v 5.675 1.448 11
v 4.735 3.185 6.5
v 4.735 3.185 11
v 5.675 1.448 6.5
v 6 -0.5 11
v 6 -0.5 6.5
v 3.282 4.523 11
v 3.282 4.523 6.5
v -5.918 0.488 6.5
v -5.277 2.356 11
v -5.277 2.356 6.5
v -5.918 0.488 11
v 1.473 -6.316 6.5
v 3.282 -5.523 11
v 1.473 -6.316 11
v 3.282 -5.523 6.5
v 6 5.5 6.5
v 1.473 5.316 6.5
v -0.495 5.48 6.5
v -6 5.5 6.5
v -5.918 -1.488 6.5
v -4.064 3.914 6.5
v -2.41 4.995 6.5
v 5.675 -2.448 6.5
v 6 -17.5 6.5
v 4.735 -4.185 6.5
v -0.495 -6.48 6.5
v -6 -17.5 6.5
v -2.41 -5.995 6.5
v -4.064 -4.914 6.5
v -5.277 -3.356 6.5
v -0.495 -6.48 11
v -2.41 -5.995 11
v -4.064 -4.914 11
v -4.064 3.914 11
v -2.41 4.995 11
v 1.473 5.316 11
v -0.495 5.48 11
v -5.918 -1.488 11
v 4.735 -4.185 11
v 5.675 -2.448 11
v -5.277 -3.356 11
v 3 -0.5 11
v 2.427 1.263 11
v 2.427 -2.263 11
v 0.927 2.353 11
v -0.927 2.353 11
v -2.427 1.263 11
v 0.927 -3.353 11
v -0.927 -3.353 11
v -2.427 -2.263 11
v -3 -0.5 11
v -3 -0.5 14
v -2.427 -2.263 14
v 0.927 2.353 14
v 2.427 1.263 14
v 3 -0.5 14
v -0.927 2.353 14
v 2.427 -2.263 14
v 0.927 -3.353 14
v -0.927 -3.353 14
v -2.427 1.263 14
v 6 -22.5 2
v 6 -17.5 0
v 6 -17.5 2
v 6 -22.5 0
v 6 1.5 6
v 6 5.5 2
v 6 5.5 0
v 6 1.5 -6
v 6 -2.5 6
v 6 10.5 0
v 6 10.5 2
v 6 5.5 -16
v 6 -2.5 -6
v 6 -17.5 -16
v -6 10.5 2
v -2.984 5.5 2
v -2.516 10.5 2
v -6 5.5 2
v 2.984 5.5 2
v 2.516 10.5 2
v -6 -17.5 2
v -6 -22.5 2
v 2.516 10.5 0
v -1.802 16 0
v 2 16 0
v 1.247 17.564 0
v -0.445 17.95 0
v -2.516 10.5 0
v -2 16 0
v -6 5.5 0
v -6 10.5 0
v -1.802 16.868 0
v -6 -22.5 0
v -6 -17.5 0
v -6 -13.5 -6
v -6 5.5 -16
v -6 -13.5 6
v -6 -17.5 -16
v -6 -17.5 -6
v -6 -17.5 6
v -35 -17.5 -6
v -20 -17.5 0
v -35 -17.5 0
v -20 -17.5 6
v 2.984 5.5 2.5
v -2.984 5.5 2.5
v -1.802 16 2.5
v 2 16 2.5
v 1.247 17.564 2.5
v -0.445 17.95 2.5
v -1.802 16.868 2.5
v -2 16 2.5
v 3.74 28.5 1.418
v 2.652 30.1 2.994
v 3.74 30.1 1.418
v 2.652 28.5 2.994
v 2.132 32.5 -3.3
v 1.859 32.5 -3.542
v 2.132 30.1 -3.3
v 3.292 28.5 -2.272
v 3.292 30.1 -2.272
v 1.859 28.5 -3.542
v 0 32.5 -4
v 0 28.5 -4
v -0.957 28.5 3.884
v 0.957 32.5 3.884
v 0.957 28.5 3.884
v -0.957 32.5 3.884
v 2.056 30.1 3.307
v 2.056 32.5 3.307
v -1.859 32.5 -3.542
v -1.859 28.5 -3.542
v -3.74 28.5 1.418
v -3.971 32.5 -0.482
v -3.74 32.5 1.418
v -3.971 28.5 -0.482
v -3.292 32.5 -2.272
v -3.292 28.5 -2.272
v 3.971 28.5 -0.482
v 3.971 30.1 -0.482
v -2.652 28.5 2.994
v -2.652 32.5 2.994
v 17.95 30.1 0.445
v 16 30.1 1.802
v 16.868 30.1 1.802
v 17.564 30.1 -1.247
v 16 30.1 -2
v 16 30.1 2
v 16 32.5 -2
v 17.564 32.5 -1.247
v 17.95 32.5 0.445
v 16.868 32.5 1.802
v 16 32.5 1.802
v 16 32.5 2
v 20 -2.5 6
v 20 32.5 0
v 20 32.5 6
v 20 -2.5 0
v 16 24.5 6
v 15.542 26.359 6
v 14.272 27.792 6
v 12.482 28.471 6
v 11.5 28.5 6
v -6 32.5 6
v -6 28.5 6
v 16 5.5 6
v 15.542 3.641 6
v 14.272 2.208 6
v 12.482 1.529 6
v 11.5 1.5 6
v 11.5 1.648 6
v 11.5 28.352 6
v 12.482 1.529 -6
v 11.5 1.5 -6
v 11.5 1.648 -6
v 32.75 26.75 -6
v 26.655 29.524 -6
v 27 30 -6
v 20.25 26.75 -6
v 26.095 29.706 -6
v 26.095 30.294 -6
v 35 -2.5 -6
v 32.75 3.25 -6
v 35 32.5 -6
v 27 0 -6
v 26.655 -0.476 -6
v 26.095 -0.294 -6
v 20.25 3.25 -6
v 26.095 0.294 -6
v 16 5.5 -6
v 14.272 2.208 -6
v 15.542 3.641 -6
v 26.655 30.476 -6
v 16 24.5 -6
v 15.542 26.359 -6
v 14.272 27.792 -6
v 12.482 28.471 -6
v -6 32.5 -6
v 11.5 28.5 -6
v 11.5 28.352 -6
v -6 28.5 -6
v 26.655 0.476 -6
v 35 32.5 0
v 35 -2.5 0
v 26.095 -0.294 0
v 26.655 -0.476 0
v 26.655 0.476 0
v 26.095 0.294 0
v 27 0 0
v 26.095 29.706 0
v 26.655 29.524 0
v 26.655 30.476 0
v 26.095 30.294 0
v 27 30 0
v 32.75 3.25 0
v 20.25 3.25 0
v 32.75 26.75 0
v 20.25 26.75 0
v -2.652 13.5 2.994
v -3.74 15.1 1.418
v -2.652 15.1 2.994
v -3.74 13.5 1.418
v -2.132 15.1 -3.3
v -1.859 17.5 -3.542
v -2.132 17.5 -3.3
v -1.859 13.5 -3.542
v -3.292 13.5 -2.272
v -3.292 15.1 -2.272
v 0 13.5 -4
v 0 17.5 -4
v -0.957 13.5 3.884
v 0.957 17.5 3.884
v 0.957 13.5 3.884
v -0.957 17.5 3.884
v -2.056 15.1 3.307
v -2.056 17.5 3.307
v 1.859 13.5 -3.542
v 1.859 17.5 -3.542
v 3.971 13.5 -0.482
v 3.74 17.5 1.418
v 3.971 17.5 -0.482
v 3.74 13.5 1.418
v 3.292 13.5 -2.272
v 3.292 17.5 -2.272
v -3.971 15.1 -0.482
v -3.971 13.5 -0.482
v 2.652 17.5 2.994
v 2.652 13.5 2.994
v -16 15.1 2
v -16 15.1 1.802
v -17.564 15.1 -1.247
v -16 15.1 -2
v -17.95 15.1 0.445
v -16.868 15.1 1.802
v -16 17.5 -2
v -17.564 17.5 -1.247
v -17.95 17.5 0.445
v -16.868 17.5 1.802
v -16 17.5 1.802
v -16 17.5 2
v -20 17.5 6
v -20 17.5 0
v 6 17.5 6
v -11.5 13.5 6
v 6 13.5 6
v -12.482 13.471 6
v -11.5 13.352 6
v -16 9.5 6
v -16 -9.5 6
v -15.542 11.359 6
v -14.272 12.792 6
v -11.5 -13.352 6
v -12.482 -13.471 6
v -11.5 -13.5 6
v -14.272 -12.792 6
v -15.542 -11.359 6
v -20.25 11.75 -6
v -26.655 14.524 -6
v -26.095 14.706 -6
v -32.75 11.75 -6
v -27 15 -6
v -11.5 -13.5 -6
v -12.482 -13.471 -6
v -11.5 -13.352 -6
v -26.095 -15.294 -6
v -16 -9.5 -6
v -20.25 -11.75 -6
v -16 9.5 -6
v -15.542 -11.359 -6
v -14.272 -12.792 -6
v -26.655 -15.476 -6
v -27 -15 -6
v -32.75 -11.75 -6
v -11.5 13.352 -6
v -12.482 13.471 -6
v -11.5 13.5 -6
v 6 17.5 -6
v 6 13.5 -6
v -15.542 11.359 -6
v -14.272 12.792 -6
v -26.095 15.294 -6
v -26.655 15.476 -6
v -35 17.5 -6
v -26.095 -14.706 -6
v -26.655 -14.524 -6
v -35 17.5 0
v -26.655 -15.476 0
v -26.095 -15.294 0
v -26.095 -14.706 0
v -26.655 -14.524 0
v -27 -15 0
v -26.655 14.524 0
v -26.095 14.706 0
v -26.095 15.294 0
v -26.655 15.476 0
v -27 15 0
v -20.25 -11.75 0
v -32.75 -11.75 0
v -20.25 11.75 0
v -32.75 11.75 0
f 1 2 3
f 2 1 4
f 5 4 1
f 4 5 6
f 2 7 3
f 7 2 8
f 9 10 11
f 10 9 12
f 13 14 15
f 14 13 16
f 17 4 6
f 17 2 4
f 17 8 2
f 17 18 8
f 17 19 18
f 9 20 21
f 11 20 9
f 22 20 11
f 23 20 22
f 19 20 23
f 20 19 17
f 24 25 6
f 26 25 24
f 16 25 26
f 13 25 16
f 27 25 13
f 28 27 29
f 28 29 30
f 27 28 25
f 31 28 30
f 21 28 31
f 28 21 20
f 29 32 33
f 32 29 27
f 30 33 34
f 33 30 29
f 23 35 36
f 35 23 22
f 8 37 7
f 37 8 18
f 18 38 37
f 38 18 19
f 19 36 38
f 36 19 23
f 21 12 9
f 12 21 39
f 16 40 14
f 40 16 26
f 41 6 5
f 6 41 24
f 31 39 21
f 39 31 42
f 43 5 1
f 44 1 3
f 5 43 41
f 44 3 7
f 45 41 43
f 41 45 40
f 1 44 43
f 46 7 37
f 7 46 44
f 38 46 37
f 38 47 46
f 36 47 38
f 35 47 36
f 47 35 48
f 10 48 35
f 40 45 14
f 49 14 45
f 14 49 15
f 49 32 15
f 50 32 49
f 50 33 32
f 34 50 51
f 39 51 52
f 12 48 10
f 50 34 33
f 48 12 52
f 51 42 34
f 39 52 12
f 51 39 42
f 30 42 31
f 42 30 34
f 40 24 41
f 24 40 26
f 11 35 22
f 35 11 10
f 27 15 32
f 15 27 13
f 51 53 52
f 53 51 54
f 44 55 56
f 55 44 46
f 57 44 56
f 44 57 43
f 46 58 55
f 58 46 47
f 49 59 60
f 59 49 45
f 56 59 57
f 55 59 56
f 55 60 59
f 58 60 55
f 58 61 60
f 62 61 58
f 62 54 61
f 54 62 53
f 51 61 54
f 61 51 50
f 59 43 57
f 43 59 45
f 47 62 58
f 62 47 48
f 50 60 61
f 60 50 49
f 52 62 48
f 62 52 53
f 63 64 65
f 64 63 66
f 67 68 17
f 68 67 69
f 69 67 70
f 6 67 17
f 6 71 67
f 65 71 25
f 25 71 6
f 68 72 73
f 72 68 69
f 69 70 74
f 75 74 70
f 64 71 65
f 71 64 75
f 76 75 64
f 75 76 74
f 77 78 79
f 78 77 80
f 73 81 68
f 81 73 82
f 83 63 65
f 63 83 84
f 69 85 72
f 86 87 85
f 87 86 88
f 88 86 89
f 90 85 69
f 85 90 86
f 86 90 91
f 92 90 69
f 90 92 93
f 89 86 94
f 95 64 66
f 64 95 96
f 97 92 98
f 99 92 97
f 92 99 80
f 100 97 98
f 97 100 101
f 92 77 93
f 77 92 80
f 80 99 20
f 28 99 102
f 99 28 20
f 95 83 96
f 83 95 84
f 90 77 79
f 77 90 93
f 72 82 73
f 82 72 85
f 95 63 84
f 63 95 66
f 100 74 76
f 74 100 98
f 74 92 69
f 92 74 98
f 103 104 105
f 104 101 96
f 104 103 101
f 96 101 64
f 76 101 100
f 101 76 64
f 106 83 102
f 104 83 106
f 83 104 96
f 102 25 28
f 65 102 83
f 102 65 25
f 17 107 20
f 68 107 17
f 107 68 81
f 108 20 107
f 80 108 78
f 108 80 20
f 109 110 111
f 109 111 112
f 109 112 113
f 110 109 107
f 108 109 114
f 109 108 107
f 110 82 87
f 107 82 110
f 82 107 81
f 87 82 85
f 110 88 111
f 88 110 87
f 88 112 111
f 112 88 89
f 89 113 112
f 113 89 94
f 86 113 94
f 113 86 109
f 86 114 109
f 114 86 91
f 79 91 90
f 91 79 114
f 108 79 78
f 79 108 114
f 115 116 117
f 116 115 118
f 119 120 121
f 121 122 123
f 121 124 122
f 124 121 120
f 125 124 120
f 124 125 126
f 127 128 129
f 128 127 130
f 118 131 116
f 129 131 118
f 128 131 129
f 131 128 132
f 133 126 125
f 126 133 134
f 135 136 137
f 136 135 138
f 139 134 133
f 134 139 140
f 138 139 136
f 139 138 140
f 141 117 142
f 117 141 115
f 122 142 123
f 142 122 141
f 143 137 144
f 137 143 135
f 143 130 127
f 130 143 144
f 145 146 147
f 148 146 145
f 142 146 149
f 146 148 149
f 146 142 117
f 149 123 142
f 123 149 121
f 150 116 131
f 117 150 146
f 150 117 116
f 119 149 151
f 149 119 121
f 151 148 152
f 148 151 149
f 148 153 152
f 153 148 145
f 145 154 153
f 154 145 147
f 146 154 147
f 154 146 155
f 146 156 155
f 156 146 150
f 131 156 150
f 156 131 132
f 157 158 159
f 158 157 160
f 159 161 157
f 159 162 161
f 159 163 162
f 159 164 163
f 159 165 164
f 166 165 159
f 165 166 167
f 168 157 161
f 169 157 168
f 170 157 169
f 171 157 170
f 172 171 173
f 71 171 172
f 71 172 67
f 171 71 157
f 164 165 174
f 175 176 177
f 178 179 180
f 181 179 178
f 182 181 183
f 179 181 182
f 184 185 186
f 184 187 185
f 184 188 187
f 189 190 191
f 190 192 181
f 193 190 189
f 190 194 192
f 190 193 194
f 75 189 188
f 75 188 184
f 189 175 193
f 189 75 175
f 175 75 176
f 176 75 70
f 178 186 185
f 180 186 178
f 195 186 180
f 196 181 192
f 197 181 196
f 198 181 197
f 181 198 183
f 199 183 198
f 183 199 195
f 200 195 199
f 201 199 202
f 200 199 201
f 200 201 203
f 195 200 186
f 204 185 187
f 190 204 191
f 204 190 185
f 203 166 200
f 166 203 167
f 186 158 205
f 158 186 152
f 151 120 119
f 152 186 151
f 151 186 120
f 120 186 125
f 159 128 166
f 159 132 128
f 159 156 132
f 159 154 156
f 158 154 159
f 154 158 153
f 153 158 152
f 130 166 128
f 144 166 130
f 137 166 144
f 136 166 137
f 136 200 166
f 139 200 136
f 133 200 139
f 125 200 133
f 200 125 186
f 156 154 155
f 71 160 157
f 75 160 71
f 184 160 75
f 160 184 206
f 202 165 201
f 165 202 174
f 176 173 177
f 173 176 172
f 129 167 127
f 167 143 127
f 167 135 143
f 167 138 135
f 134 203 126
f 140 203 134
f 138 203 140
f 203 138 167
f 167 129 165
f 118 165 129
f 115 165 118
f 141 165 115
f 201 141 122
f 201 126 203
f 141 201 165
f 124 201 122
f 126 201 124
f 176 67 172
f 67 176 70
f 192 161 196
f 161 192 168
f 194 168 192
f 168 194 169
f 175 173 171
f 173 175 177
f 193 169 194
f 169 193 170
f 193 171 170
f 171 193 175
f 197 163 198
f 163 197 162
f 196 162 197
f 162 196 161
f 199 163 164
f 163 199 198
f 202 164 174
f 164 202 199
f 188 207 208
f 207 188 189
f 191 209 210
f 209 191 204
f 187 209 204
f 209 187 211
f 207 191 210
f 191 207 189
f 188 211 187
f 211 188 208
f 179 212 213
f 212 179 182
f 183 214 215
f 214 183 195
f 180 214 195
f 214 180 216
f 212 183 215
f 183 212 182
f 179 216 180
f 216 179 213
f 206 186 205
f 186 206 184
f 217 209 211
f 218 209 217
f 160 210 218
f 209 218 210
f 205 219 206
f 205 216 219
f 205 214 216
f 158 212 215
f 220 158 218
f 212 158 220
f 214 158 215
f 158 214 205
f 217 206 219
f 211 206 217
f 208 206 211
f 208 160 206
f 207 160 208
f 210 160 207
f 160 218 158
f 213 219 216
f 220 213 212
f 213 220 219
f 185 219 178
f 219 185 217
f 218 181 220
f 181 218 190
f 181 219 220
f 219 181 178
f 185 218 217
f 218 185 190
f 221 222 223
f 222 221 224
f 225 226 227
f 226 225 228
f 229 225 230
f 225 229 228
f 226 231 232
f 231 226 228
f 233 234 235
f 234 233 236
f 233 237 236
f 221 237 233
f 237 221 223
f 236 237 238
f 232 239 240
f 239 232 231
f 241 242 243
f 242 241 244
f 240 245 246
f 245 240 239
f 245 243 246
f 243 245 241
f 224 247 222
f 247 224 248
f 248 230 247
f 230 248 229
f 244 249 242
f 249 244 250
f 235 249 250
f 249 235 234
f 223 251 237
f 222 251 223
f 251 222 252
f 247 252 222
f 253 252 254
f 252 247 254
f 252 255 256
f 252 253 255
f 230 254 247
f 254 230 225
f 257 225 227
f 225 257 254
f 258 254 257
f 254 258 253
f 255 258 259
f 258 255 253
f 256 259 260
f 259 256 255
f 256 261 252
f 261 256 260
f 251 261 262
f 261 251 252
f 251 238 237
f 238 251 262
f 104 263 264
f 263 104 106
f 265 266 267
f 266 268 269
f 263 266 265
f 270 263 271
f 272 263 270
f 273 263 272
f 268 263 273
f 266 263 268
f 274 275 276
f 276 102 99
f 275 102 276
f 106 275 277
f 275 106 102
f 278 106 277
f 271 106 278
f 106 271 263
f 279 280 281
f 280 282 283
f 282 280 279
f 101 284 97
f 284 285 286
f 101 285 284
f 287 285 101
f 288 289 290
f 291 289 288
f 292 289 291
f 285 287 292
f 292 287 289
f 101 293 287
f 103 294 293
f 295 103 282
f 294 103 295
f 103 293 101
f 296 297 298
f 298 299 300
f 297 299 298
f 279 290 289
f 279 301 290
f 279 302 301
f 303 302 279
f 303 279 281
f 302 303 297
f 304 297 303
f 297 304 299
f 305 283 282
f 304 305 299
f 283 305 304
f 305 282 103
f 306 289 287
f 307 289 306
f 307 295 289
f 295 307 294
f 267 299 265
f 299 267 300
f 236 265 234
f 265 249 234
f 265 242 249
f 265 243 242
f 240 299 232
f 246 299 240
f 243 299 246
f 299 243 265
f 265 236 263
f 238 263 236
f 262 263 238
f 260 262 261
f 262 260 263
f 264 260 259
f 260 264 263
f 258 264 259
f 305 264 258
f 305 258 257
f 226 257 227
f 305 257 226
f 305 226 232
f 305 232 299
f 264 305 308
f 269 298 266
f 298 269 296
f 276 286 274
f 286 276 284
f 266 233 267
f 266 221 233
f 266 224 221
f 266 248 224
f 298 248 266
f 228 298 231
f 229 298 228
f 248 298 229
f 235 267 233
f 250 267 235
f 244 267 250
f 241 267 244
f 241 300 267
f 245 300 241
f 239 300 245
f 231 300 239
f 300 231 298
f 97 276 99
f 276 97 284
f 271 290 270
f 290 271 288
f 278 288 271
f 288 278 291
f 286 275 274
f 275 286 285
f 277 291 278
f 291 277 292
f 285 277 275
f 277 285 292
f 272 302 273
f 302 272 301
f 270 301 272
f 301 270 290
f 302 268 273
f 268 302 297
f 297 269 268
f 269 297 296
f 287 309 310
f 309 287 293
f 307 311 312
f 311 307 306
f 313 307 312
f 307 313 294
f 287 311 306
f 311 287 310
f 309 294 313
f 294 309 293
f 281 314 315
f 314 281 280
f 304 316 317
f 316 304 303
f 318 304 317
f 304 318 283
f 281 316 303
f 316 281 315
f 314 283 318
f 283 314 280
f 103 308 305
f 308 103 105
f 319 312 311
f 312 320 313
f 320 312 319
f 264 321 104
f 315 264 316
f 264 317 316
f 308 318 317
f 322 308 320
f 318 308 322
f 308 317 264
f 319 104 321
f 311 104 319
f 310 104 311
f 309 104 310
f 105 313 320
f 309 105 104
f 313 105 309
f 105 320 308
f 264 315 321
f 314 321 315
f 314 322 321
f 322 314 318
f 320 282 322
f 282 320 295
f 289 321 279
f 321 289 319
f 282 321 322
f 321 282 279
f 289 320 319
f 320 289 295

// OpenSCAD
// file: servo_arm.scad
module
servo_arm(body_r = 8 / 2,
          arm_r1 = 7 / 2,
          arm_r2 = 4 / 2,
          arm_len = 16,
          arm_t = 2.5,
          body_t = 7)
{
    cylinder(r = body_r, h = body_t);

    linear_extrude(height = arm_t)
    {
        circle(r = arm_r1);
        translate([ 0, arm_len, 0 ]) circle(r = arm_r2);
        polygon(points = [
            [ -arm_r1, 0 ],
            [ arm_r1, 0 ],
            [ arm_r2, arm_len ],
            [ -arm_r2, arm_len ]
        ]);
    }
}

servo_arm();
// file: servo.scad
// 3dof quad
//
// servo

module
servo(a = 30,
      b = 23,
      c = 27,
      d = 12,
      e = 33,
      f = 16,
      flange_thickness = 2,
      top_cap_pct = 0.5)
{
    rem_height = c - flange_thickness - f;
    top_cap_height = rem_height * top_cap_pct;
    roundel_height = rem_height * (1.0 - top_cap_pct);

    translate([ 0, -d / 2, 0 ]) union()
    {
        translate([ 0, 0, flange_thickness / 2 ])
            cube([ d, e, flange_thickness ], center = true);
        translate([ 0, 0, -f / 2 ]) cube([ d, b, f ], center = true);
        translate([ 0, 0, flange_thickness + top_cap_height / 2 ])
            cube([ d, b, top_cap_height ], center = true);
        translate(
            [ 0, b / 2 - d / 2, flange_thickness + top_cap_height ]) union()
        {
            cylinder(r = d / 2, h = roundel_height);
            translate([ 0, 0, roundel_height ]) cylinder(r = 3, h = 3);
        }
    }
}

color("blue") servo();
// main file
// 3dof quad
//
// coxa

include <servo.scad>
include <servo_arm.scad>

module
coxa(servo_height = 27, servo_clearance = 7)
{
    arm_thick = 4;
    servo_width = 12;
    flange_length = 3;
    base_thick = 4;
    root_radius = 4;

    fork_width = servo_width + flange_length + servo_clearance + base_thick;
    fork_height = arm_thick * 2 + servo_height;

    servo_cog_offset = 6;

    translate([ fork_width / 2 - servo_cog_offset, 0, 0 ]) union()
    {
        difference()
        {
            cube([ fork_width, fork_height, 12 ], center = true);
            translate([ -root_radius / 2 - base_thick / 2 - 1, 0, 0 ]) cube(
                [
                    1 + servo_width + flange_length + servo_clearance -
                        root_radius,
                    servo_height,
                    13
                ],
                center = true);
            translate([ -base_thick / 2, 0, 0 ]) cube(
                [
                    servo_width + flange_length + servo_clearance,
                    servo_height - 2 * root_radius,
                    13
                ],
                center = true);
            translate([ 5, -9.5, 0 ])
                cylinder(r = root_radius, h = 13, center = true);
            translate([ 5, 9.5, 0 ])
                cylinder(r = root_radius, h = 13, center = true);
            color("white") translate(
                [ servo_cog_offset - fork_width / 2, 0.1 + fork_height / 2, 0 ])
                rotate([ 90, 90, 0 ]) servo_arm();
        }

        translate([ fork_width / 2 + 15 / 2, 0, -3 ])
        {
            difference()
            {
                cube([ 15, fork_height, 6 ], center = true);
                translate([ -1, 0, 0 ]) cube([ 12.5, 23.5, 7 ], center = true);
                for (i = [ -1, 1 ]) {
                    translate([ -1, i * 30 / 2, 0 ])
                        cylinder(r = 0.5, h = 20, center = true);
                }
            }
        }
    }
}

translate([0,15,0]) coxa();
scale([-1, 1, 1]) coxa();
